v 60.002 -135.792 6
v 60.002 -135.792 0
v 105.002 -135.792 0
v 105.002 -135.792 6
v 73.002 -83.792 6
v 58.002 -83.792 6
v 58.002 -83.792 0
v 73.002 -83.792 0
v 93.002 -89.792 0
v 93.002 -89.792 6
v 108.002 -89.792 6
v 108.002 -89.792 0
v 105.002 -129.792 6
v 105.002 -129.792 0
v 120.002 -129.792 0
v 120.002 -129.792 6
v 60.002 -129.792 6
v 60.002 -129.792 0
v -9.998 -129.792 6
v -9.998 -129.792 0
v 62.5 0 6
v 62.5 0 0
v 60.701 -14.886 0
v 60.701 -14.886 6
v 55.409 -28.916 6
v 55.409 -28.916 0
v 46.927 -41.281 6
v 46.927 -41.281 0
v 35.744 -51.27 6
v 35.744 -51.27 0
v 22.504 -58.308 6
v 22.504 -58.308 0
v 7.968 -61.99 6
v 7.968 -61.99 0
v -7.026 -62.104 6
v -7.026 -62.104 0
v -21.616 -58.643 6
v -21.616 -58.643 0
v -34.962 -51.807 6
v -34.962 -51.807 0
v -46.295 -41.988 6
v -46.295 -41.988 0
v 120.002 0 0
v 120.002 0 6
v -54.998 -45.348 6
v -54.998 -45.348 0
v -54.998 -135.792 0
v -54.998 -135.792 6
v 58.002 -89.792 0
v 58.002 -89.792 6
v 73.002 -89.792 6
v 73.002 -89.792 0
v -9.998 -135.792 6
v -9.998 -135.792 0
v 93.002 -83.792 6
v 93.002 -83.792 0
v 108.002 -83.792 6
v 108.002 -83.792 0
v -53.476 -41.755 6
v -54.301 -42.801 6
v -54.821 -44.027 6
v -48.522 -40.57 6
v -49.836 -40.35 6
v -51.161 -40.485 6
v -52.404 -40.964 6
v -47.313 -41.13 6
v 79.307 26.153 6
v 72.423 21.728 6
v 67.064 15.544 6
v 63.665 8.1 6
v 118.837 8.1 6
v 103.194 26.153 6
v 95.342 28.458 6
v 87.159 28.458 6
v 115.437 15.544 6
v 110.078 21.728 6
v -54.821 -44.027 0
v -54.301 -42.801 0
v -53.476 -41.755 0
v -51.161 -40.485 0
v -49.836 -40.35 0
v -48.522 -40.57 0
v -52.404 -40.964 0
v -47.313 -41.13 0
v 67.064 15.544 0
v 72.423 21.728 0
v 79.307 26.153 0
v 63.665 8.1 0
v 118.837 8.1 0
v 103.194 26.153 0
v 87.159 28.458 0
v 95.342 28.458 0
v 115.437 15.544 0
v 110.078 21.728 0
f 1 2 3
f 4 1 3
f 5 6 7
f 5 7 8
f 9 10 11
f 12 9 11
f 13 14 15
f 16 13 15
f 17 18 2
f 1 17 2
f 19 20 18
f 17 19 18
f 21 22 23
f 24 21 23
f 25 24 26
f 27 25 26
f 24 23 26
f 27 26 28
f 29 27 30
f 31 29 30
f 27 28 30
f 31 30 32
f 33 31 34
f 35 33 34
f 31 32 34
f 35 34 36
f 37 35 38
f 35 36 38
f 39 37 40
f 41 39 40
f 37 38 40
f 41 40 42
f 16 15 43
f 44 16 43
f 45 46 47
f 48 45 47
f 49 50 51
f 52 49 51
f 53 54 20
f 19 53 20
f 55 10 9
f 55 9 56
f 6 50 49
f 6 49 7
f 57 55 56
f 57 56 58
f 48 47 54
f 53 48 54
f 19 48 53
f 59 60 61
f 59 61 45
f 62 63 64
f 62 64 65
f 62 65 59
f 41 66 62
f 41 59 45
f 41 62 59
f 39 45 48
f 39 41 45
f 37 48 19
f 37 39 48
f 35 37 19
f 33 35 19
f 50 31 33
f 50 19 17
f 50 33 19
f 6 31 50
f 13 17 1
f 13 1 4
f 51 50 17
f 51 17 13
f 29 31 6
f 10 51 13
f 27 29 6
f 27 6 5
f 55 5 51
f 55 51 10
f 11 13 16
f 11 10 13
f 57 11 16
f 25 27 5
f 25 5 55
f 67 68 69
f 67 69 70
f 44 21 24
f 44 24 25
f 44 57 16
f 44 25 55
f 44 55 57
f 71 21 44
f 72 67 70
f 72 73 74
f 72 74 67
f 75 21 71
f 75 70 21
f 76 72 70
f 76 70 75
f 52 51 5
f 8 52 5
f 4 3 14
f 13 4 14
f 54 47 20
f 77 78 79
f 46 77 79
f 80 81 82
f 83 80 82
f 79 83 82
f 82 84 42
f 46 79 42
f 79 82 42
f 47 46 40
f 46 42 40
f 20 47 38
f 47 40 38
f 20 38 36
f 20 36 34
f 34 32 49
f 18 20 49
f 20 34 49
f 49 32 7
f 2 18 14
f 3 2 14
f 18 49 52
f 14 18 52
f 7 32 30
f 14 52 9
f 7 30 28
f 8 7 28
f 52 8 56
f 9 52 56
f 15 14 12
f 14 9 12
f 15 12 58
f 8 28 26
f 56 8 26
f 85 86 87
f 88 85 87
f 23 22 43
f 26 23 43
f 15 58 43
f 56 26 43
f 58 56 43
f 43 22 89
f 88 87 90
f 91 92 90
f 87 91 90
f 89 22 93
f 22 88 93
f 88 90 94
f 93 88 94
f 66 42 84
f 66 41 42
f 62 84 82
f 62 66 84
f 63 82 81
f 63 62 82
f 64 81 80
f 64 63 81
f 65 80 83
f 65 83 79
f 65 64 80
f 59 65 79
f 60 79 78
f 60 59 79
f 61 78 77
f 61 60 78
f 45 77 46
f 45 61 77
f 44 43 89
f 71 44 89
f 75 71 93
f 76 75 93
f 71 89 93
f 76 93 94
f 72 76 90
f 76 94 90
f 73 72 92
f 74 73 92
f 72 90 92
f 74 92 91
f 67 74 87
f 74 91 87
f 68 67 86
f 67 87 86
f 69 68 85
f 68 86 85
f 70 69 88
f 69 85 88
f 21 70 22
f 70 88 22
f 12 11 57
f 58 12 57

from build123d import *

# Parameters (mm, degrees)
BOSS_EXTRUDE1_DEPTH = 6
SKETCH2_W           = 15
SKETCH2_H           = 6
CUT_EXTRUDE1_DEPTH  = 10
FILLET1_R           = 5


with BuildPart() as part:
    # Sketch1 → Boss-Extrude1 (new body)
    with BuildSketch(Plane.XY):
        with BuildLine():
            Line((105.001506242, -129.791901429), (120.001506242, -129.791901429))
            Line((120.001506242, -129.791901429), (120.001506242, 0))
            ThreePointArc((120.001506242, 0), (91.250753121, 28.750753121), (62.5, 0))
            ThreePointArc((62.5, 0), (15.310848117, -60.595609824), (-54.998493758, -29.688645714))
            Line((-54.998493758, -29.688645714), (-54.998493758, -129.791901429))
            Line((-54.998493758, -129.791901429), (-54.998493758, -135.791901429))
            Line((-54.998493758, -135.791901429), (-9.998493758, -135.791901429))
            Line((-9.998493758, -135.791901429), (-9.998493758, -129.791901429))
            Line((-9.998493758, -129.791901429), (60.001506242, -129.791901429))
            Line((60.001506242, -129.791901429), (60.001506242, -135.791901429))
            Line((60.001506242, -135.791901429), (105.001506242, -135.791901429))
            Line((105.001506242, -135.791901429), (105.001506242, -129.791901429))
        make_face()
    extrude(amount=BOSS_EXTRUDE1_DEPTH)

    # Sketch2 → Cut-Extrude1 (cut)
    with BuildSketch(Plane.XY.offset(6)):
        with Locations((65.501506242, -86.791901429)):
            Rectangle(SKETCH2_W, SKETCH2_H)
        with Locations((100.501506242, -86.791901429)):
            Rectangle(SKETCH2_W, SKETCH2_H)
    extrude(amount=-CUT_EXTRUDE1_DEPTH, mode=Mode.SUBTRACT)

    # Fillet1
    fillet1_edges = [part.edges().sort_by_distance(p)[0] for p in [
        (-54.998493758, -29.688645714, 3),
    ]]
    fillet(fillet1_edges, radius=FILLET1_R)


solid = part.part
